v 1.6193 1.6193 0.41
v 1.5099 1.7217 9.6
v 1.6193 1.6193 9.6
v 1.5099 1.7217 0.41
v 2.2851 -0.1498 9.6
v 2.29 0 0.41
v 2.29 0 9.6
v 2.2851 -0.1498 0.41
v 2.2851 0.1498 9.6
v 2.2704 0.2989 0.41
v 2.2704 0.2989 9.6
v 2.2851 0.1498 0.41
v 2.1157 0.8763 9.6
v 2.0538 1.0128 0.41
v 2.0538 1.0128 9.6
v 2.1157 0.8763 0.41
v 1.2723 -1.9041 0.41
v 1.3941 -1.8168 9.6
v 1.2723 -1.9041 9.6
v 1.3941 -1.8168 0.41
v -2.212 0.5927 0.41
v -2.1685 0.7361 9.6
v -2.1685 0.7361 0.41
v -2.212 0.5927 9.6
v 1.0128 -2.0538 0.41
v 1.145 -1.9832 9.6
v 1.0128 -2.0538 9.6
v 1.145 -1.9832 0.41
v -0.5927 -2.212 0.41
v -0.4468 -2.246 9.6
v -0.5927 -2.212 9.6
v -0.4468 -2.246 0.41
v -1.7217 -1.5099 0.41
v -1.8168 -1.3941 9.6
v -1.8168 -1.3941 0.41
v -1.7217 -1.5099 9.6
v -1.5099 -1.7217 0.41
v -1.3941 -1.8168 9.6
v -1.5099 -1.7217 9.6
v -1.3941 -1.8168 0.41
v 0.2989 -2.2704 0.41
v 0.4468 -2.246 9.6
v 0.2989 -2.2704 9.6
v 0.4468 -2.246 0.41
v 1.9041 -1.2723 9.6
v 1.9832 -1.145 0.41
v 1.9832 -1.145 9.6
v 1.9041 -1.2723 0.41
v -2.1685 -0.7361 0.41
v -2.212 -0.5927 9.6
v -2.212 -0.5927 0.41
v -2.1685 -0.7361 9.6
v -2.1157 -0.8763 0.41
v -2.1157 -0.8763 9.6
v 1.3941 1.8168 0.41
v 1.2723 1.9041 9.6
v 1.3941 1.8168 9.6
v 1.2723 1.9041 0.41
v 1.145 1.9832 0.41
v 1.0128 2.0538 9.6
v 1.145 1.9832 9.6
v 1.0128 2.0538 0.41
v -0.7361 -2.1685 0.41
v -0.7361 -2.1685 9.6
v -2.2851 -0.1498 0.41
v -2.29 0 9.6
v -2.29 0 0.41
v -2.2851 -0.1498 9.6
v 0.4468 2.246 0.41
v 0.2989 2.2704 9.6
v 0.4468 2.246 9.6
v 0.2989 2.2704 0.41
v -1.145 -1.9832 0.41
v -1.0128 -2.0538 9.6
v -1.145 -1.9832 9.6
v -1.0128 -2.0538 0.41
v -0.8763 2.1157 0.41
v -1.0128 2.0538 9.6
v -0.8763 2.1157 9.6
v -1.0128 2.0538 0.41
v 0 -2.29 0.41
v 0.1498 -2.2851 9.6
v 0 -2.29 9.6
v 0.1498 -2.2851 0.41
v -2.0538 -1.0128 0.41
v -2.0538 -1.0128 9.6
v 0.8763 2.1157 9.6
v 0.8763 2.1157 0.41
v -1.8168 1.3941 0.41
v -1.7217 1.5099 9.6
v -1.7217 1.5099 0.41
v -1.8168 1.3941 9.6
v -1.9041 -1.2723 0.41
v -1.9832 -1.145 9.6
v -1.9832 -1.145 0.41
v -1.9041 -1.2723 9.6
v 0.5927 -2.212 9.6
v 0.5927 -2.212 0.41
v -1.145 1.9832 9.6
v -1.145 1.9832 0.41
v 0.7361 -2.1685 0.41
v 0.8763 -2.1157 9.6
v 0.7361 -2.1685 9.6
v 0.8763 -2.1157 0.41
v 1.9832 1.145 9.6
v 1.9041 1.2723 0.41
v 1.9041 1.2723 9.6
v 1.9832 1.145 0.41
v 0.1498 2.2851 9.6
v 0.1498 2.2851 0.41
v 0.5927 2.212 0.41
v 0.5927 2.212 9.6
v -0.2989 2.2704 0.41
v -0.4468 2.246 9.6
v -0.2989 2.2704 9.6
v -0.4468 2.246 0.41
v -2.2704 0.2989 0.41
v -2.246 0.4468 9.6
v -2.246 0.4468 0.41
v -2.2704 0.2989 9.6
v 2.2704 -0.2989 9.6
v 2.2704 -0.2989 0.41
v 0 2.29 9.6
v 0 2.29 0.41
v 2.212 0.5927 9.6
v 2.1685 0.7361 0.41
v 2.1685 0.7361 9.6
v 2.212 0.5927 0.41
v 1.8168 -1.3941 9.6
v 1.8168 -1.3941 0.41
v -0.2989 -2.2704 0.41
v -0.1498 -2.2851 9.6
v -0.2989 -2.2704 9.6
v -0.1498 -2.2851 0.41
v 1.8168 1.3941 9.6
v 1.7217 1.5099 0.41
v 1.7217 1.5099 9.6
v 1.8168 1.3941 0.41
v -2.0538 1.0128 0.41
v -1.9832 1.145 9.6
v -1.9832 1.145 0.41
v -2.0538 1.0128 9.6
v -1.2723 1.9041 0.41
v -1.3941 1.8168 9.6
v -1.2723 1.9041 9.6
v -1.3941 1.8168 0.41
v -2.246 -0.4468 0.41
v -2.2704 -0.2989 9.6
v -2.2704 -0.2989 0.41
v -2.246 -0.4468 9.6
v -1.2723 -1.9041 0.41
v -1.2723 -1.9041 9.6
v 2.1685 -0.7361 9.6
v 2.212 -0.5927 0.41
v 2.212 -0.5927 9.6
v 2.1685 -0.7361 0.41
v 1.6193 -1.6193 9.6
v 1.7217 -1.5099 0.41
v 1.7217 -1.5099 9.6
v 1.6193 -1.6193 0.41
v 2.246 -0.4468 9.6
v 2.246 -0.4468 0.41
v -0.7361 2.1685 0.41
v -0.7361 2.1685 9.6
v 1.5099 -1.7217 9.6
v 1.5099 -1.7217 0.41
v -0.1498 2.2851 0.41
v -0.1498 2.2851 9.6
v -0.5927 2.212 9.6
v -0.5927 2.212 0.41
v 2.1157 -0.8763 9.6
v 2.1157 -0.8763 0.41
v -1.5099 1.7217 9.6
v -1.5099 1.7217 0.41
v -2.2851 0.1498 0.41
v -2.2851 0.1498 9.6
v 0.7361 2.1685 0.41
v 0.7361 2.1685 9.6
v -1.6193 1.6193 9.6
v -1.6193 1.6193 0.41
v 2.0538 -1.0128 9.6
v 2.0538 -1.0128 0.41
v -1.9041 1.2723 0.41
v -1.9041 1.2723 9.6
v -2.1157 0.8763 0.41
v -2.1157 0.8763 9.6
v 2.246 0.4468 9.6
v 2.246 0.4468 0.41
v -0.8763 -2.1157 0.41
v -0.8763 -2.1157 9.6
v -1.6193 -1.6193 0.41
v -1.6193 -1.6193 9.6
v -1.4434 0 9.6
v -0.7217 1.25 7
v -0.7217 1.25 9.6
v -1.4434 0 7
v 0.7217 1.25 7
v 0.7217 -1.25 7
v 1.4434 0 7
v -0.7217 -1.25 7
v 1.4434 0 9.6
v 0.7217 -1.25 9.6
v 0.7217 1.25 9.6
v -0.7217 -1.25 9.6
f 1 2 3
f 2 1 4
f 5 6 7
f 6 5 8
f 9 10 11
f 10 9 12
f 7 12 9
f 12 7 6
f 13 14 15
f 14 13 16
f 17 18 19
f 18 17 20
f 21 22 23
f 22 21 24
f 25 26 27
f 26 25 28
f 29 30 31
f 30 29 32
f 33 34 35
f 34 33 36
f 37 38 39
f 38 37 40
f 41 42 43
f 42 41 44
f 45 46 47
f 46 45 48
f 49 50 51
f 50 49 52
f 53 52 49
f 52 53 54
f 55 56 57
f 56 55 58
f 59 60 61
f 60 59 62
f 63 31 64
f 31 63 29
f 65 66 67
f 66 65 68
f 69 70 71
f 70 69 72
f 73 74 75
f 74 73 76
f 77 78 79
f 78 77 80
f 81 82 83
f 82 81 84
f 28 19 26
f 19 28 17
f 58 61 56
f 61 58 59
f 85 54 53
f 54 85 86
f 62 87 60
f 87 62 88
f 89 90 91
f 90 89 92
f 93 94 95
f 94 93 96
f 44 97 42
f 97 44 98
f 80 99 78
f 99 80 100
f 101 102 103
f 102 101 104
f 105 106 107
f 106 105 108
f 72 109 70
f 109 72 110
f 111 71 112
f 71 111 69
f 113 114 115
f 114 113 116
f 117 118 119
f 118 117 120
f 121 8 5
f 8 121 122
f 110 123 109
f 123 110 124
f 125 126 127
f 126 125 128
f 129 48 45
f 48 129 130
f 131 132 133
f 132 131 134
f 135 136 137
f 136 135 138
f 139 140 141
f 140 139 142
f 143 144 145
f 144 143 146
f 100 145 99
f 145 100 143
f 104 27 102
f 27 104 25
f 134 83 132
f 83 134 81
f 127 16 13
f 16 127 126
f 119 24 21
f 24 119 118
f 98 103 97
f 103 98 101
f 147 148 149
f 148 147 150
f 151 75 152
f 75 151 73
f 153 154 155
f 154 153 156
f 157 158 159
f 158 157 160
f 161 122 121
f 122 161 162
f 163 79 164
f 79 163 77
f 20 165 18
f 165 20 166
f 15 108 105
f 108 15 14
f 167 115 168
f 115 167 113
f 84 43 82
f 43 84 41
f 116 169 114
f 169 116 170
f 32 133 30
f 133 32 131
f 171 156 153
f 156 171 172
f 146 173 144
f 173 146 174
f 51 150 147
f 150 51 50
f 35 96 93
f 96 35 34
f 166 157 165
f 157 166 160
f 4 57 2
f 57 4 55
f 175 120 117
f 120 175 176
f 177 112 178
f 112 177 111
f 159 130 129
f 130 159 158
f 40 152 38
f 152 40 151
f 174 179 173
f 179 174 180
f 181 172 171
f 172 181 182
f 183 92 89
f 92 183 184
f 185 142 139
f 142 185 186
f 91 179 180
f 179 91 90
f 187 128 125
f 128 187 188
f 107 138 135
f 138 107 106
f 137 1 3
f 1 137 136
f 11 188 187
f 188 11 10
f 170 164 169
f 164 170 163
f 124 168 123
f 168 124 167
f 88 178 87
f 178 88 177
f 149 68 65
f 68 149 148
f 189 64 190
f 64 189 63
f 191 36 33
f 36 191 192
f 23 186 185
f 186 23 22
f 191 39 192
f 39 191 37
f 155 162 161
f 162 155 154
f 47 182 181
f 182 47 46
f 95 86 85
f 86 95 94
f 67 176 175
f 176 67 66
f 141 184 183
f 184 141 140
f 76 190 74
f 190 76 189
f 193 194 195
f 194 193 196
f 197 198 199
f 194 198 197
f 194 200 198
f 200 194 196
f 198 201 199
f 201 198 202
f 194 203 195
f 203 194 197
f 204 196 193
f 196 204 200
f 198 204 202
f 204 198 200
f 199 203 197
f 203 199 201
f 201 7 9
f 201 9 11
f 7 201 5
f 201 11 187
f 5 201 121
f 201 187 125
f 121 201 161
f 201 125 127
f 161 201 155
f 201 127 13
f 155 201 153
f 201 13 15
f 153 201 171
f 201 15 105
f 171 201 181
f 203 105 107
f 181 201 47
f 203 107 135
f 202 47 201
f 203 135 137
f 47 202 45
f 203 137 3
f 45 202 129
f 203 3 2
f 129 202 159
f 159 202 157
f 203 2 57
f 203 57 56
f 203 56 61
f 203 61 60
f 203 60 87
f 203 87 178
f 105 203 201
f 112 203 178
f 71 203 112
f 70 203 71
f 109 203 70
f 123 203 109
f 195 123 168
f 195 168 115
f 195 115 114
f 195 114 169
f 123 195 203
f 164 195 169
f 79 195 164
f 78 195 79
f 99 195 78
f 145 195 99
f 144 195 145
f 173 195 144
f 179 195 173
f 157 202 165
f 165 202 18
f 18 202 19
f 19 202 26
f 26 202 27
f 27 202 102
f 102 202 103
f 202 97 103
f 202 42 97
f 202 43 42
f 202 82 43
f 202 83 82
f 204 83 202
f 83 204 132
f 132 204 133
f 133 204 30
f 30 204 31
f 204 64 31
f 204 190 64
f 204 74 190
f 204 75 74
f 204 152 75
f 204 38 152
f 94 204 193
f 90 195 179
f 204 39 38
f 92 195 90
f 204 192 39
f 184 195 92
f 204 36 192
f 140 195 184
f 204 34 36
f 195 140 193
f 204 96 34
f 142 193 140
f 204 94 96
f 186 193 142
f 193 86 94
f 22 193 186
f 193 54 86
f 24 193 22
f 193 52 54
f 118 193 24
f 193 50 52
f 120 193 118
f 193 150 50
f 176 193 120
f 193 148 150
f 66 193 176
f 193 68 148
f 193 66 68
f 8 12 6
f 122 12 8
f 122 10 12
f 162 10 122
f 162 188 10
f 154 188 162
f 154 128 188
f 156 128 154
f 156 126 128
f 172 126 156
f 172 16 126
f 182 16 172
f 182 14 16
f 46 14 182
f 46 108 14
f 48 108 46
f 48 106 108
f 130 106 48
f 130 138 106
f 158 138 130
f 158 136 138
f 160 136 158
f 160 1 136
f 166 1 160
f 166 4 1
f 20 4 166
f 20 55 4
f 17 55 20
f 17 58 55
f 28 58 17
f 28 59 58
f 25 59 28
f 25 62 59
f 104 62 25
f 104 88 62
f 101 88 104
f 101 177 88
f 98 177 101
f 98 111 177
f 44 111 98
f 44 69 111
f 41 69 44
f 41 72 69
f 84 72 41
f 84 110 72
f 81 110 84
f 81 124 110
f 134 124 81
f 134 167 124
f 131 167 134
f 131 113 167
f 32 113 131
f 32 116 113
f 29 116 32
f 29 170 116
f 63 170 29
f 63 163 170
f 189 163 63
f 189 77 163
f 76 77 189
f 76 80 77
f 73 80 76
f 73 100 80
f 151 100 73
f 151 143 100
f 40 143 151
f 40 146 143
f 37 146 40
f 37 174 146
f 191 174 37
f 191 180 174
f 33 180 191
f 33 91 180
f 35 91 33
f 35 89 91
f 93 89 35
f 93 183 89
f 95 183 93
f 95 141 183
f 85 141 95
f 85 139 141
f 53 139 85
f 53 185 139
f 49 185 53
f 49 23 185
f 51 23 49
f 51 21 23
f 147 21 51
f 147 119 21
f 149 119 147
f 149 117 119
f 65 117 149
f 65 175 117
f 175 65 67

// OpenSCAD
$fn = 96;

// M5 grub screw (set screw) approximation
// Parameters (mm)
d_major = 5.0;          // thread major diameter
pitch   = 0.8;          // M5 coarse pitch
len     = 10.0;         // overall length
hex_af  = 2.5;          // internal hex across flats (common for M5 grub)
hex_depth = 3.0;        // depth of hex socket
chamfer = 0.4;          // end chamfer
thread_depth = 0.35;    // radial thread depth (approx)
crest_flat = 0.12;      // small flattening at crest/root

module hex_socket(af=2.5, depth=3.0) {
    // Hex prism sized by across-flats
    r = af / (2*cos(30));
    linear_extrude(height=depth, center=false)
        polygon([ for (i=[0:5]) [ r*cos(60*i), r*sin(60*i) ] ]);
}

module helical_thread(d=5, p=0.8, L=10, depth=0.35, crest=0.12) {
    // Create an external thread by sweeping a triangular-ish profile around Z
    // using linear_extrude with twist.
    turns = L / p;
    twist_deg = 360 * turns;

    // Profile in (x,y) plane, then extruded along Z with twist.
    // Place profile near radius d/2.
    R = d/2;

    // A simple trapezoid-ish profile approximating ISO metric thread
    // centered around the pitch line.
    // y is radial direction; x is along pitch direction (one pitch wide).
    w = p;
    y0 = R - depth;          // root radius
    y1 = R - crest;          // near crest
    y2 = R;                  // crest radius

    // Slightly flattened crest/root
    profile = [
        [0.00*w, y0],
        [0.20*w, y0],
        [0.50*w, y2],
        [0.80*w, y0],
        [1.00*w, y0],
        [1.00*w, y1],
        [0.80*w, y1],
        [0.50*w, y2 - crest],
        [0.20*w, y1],
        [0.00*w, y1]
    ];

    // Sweep around Z: translate profile so x maps to angle via twist
    // We position the profile at +X by rotating the whole extrude later.
    rotate([0,0,0])
    linear_extrude(height=L, twist=twist_deg, slices=max(ceil(turns*40), 80), convexity=10)
        polygon(profile);
}

module grub_screw() {
    difference() {
        union() {
            // Core cylinder slightly under major diameter to avoid overly sharp thread
            cylinder(h=len, d=d_major - 2*thread_depth*0.6);

            // External thread
            // Shift thread profile so it wraps around the cylinder:
            // We rotate the swept profile around Z by 90deg and translate so its radial axis aligns.
            // The profile uses y as radius; we need it centered at origin already.
            // The polygon is defined in x (pitch) and y (radius), so it already sits at correct radius.
            // But it is not centered at origin in x; that's fine for twist extrusion.
            // Rotate so the "radius" axis points outward from origin.
            rotate([0,0,0])
                helical_thread(d=d_major, p=pitch, L=len, depth=thread_depth, crest=crest_flat);
        }

        // Internal hex socket at top
        translate([0,0,len-hex_depth])
            hex_socket(af=hex_af, depth=hex_depth + 0.2);

        // Chamfer both ends
        // Top chamfer
        translate([0,0,len-chamfer])
            cylinder(h=chamfer+0.01, d1=d_major+0.6, d2=d_major-0.2);

        // Bottom chamfer
        translate([0,0,-0.01])
            cylinder(h=chamfer+0.02, d1=d_major-0.2, d2=d_major+0.6);
    }
}

grub_screw();
